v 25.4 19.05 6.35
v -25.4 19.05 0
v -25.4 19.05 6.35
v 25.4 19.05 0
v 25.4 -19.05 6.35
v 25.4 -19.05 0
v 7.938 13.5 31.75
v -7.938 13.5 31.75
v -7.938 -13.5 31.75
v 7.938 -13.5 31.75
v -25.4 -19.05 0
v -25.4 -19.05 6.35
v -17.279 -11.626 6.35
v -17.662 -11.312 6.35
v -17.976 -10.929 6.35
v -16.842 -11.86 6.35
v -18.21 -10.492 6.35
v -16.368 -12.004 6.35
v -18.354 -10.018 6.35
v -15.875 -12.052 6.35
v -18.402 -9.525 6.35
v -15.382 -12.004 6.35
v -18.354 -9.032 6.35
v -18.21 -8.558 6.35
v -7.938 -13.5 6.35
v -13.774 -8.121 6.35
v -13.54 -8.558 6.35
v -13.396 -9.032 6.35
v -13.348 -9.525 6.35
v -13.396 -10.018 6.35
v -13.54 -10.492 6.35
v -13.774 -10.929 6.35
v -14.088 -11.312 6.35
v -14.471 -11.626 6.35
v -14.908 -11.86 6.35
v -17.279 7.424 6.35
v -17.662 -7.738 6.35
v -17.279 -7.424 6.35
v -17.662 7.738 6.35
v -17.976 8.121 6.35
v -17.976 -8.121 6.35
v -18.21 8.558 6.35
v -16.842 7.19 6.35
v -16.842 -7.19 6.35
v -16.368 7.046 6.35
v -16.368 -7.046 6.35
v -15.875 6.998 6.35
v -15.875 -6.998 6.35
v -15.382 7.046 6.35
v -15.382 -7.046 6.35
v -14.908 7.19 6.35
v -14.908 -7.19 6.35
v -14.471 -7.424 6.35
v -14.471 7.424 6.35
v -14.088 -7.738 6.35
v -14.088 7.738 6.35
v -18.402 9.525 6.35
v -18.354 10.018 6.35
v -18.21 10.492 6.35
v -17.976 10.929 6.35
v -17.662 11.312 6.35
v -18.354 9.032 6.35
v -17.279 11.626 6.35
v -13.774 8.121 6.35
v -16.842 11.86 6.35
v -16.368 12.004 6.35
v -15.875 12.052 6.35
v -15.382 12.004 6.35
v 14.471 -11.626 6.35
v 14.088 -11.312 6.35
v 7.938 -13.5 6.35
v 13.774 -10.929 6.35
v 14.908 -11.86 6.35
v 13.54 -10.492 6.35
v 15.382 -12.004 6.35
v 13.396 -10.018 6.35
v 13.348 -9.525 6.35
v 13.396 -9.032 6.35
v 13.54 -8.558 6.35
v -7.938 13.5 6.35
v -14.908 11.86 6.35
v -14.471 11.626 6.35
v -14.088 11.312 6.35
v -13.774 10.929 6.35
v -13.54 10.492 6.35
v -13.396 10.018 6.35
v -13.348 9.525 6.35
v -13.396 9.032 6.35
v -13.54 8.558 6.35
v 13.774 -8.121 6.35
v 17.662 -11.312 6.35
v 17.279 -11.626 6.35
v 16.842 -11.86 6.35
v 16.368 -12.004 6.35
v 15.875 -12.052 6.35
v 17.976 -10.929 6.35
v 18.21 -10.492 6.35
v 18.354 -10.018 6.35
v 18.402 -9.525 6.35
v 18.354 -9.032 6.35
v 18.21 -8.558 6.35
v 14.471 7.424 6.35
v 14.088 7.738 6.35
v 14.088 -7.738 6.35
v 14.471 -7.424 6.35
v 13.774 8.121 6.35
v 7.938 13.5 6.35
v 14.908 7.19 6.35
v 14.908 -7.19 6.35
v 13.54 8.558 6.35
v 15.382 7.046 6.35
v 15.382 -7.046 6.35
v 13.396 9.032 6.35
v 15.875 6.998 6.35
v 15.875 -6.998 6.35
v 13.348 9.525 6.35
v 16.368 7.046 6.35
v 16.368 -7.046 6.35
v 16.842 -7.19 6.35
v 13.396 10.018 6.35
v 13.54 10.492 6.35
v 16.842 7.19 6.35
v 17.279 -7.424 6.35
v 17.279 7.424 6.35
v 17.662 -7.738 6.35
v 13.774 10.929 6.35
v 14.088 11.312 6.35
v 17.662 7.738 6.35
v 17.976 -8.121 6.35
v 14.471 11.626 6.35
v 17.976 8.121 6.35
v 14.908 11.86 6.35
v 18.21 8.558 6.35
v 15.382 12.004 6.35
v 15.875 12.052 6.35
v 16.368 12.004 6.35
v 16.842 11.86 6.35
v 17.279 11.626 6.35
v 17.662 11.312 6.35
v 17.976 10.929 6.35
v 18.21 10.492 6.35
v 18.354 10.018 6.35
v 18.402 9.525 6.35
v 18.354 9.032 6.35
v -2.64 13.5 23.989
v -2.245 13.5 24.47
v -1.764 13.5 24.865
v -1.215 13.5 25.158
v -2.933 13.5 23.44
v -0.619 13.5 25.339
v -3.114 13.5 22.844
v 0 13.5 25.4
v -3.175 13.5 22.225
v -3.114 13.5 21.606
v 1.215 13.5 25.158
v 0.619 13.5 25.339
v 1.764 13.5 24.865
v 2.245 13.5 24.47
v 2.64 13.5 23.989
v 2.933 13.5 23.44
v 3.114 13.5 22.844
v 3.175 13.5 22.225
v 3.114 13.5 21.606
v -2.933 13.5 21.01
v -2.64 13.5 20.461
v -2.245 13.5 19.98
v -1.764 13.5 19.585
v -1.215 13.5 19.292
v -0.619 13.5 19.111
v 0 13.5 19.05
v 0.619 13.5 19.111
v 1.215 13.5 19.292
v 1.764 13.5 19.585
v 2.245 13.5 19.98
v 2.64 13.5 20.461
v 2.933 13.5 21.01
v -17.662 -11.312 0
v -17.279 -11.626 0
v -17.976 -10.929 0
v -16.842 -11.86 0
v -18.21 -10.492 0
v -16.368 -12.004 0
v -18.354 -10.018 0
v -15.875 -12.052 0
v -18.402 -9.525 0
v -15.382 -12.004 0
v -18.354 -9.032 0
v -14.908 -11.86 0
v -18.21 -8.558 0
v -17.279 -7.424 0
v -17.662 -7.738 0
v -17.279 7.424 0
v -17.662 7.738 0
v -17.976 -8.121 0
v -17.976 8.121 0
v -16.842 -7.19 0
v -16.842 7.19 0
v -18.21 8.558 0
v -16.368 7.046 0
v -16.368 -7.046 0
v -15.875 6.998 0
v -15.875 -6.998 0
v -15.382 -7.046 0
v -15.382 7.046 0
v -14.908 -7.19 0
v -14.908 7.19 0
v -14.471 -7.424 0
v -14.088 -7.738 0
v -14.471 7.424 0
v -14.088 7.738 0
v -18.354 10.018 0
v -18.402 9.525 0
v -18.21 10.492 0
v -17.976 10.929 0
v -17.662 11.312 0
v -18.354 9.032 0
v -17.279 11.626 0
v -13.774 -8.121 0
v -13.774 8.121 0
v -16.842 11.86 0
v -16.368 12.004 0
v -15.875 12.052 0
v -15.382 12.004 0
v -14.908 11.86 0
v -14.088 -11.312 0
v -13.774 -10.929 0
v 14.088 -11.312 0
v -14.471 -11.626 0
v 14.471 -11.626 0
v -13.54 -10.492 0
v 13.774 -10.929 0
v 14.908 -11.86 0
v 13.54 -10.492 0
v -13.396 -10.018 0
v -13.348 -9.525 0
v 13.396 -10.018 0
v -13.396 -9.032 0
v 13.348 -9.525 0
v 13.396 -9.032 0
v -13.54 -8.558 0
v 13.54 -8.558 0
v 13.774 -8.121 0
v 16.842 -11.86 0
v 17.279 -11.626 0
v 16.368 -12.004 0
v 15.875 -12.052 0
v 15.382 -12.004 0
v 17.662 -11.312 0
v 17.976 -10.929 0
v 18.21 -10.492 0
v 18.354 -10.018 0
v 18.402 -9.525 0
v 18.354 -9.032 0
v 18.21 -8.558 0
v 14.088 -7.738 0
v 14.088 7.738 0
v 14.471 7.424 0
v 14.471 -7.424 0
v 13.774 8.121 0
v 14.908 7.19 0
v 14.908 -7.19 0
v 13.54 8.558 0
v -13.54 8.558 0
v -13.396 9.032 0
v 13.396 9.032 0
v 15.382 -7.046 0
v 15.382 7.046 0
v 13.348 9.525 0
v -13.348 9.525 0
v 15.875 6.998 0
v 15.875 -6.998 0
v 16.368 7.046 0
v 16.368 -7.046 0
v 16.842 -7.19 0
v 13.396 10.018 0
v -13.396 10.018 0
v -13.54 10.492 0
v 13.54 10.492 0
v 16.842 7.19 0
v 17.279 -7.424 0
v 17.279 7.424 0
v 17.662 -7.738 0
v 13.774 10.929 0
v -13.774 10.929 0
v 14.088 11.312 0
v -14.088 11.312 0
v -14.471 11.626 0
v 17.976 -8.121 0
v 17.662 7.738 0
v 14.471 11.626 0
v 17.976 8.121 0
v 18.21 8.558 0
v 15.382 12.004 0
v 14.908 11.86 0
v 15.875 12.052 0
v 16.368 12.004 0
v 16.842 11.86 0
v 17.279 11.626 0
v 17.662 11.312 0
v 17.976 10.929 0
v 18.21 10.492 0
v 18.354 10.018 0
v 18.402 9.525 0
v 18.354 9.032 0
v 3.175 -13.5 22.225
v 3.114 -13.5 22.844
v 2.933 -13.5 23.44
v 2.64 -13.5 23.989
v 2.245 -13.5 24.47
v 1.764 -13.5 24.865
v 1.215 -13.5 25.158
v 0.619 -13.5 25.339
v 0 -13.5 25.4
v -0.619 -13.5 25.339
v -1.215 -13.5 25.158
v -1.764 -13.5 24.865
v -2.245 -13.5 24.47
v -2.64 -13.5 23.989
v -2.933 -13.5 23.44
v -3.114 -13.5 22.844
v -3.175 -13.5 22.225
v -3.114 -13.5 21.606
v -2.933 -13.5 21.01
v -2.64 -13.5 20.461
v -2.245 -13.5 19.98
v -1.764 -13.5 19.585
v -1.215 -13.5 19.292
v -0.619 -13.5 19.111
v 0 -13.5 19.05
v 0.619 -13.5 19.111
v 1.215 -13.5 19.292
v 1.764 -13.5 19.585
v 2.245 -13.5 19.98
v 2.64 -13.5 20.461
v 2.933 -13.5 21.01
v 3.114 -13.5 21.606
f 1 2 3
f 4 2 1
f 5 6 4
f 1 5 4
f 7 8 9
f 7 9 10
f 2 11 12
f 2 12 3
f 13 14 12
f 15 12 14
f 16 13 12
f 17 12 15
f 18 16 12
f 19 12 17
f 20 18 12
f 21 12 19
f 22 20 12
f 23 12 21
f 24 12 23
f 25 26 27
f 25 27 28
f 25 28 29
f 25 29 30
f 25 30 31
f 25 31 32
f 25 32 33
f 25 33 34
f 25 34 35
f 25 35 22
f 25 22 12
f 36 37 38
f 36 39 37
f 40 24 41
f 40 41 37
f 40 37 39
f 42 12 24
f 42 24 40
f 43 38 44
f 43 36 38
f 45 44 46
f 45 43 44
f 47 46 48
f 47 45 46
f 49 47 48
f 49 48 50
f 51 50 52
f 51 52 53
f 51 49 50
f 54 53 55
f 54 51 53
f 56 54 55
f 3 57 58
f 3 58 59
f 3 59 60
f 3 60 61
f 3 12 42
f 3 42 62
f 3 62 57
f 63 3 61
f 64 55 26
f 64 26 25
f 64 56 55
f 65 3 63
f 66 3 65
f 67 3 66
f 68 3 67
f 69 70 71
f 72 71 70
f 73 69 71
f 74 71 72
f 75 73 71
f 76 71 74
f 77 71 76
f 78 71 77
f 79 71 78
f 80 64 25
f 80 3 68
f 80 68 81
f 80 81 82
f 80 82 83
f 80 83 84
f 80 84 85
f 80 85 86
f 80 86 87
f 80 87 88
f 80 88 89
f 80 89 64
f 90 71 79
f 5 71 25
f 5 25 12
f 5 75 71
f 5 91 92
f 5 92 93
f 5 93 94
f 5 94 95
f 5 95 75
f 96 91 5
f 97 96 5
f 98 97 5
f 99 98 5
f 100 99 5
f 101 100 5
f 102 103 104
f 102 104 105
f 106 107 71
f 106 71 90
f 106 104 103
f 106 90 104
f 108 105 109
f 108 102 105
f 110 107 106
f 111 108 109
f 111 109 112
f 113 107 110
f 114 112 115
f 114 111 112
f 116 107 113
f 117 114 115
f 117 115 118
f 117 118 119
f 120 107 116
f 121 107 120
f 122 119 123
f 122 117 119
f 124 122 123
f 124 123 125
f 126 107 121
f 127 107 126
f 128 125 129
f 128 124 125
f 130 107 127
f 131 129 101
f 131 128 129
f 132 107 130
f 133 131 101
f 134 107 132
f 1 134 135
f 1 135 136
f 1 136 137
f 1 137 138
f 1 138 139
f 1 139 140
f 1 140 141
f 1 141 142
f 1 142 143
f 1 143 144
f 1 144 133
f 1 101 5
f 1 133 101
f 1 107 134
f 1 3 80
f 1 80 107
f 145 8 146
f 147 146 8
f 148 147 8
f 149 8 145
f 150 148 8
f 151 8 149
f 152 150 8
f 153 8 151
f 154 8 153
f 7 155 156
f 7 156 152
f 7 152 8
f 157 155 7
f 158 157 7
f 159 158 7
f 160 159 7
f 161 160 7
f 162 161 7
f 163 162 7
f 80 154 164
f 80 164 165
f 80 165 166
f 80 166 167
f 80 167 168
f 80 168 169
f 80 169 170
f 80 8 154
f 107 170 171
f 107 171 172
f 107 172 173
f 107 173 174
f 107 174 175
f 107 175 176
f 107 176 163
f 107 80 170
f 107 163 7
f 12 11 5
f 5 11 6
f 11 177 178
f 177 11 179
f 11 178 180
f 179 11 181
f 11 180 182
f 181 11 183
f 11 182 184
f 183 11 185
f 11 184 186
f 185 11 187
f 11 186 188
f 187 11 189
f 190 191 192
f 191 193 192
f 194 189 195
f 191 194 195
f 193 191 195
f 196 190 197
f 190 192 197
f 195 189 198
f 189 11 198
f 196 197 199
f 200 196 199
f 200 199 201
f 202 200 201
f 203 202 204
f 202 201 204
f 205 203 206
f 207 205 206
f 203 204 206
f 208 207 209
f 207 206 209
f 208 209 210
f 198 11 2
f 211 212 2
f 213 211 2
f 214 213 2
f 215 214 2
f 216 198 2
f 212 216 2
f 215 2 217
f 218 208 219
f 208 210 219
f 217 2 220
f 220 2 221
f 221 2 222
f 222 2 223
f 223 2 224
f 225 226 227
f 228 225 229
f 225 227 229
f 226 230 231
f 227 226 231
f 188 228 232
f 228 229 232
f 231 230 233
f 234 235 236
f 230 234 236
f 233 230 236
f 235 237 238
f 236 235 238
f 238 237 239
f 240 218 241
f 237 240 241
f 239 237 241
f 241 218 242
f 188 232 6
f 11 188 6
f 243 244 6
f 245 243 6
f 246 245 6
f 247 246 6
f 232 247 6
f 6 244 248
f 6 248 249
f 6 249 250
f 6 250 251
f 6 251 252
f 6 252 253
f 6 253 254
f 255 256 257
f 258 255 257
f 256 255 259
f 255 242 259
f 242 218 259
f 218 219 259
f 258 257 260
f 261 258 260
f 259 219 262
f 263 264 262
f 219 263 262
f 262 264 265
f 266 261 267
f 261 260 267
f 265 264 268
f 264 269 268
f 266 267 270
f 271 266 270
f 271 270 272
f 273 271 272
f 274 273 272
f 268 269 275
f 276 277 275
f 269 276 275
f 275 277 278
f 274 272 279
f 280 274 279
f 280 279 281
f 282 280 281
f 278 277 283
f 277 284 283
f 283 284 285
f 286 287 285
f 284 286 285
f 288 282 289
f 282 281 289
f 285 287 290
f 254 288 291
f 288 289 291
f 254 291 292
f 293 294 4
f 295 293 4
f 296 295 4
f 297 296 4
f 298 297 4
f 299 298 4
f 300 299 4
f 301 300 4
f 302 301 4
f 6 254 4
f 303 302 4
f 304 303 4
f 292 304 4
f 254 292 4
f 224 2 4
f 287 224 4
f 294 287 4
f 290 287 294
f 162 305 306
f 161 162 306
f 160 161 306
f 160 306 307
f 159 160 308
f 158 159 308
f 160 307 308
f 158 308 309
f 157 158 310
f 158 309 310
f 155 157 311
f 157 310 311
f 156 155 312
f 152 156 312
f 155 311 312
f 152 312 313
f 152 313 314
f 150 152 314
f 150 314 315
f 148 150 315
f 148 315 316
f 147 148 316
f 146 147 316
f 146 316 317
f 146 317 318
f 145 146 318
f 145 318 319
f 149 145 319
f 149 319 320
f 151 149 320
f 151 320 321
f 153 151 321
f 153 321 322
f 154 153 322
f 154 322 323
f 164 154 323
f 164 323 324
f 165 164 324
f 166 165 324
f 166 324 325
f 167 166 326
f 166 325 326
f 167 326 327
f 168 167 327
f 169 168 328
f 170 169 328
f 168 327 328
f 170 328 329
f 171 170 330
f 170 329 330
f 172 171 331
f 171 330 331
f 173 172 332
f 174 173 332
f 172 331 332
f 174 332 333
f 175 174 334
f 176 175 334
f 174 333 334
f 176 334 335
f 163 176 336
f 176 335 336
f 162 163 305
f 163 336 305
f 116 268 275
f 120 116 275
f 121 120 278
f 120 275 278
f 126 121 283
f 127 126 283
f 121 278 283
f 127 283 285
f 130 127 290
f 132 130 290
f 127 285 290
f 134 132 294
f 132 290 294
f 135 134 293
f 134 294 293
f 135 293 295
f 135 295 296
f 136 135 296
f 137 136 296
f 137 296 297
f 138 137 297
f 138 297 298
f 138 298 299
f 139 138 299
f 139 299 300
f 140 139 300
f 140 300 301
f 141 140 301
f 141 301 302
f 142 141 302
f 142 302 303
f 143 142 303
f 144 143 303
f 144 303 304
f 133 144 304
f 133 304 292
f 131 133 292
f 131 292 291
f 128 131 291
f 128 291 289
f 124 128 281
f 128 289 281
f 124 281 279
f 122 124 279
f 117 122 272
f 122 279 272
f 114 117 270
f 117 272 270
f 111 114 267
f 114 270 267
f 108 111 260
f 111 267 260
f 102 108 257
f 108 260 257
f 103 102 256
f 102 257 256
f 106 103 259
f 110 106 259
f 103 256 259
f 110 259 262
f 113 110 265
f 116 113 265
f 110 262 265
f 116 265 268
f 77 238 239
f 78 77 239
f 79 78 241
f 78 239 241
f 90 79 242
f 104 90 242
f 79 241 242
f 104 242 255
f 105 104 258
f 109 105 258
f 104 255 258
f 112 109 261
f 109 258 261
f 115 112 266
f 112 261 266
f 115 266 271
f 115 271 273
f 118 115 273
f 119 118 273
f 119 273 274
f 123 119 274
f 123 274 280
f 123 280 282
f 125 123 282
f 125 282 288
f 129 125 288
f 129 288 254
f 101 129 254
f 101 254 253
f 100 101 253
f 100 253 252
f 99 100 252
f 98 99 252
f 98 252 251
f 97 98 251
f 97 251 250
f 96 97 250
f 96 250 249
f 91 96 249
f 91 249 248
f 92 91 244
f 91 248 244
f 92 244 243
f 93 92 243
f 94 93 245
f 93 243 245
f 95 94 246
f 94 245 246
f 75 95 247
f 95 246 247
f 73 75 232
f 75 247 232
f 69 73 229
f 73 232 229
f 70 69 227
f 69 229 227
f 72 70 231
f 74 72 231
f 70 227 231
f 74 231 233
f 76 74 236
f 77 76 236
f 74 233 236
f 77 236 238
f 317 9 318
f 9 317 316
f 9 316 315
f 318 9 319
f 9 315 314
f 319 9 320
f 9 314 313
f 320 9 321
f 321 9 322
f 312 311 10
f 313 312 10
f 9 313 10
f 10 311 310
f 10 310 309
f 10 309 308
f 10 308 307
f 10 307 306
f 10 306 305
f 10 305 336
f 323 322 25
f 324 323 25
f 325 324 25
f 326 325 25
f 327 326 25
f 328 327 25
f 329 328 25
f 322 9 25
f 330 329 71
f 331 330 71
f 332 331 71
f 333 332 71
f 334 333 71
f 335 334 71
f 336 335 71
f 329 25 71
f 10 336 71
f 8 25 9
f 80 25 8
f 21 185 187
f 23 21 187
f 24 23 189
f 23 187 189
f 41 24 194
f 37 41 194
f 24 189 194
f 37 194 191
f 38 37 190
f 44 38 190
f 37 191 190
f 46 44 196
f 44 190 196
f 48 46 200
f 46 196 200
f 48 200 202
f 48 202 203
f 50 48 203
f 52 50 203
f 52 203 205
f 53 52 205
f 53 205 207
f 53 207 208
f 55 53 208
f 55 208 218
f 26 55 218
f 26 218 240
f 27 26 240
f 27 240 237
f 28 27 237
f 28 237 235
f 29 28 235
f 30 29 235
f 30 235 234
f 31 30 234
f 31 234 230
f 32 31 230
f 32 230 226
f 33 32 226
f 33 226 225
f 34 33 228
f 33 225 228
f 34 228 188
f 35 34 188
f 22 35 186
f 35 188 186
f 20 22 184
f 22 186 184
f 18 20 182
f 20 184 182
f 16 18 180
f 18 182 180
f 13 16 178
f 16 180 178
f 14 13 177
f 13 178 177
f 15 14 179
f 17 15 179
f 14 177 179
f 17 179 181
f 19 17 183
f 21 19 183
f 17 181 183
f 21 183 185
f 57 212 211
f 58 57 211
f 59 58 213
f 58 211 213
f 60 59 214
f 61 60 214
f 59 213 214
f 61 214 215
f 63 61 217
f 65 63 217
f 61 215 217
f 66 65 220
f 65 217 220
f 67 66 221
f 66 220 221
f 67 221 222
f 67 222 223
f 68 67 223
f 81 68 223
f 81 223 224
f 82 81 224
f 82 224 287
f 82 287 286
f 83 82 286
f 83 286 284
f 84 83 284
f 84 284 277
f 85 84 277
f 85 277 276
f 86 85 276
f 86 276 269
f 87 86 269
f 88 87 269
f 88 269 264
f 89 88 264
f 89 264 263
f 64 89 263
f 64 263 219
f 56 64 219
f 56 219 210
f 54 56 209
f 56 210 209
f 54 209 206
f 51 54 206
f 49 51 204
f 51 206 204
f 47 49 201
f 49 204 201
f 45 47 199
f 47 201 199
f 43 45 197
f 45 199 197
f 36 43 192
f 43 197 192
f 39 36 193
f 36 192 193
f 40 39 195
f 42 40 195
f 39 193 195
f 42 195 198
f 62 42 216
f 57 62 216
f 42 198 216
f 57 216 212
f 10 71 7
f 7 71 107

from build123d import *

# Parameters (mm, degrees)
F0_W     = 50.8
F0_H     = 38.1
F1_DEPTH = 6.35
F2_W     = 15.875
F2_H     = 27
F3_DEPTH = 25.4
F4_R     = 3.175
F5_DEPTH = 32.551
F7_D     = 5.0546


with BuildPart() as f1:
    # F0 (on Top) → F1 (new body)
    with BuildSketch(Plane.XY):
        Rectangle(F0_W, F0_H)
    extrude(amount=F1_DEPTH)

    # F2 (on face) → F3 (join)
    with BuildSketch(Plane.XY.offset(6.35)):
        Rectangle(F2_W, F2_H)
    extrude(amount=F3_DEPTH)

    # F4 (on face) → F5 (cut, through all)
    with BuildSketch(Plane.XZ.offset(13.5)):
        with Locations((0, 22.225)):
            Circle(F4_R)
    extrude(amount=-F5_DEPTH, mode=Mode.SUBTRACT)

    # F7 (through all)
    with Locations(Plane.XY.offset(6.35)):
        with Locations((-15.875, 9.525), (-15.875, -9.525), (15.875, 9.525), (15.875, -9.525)):
            Hole(F7_D / 2)


solid = f1.part
